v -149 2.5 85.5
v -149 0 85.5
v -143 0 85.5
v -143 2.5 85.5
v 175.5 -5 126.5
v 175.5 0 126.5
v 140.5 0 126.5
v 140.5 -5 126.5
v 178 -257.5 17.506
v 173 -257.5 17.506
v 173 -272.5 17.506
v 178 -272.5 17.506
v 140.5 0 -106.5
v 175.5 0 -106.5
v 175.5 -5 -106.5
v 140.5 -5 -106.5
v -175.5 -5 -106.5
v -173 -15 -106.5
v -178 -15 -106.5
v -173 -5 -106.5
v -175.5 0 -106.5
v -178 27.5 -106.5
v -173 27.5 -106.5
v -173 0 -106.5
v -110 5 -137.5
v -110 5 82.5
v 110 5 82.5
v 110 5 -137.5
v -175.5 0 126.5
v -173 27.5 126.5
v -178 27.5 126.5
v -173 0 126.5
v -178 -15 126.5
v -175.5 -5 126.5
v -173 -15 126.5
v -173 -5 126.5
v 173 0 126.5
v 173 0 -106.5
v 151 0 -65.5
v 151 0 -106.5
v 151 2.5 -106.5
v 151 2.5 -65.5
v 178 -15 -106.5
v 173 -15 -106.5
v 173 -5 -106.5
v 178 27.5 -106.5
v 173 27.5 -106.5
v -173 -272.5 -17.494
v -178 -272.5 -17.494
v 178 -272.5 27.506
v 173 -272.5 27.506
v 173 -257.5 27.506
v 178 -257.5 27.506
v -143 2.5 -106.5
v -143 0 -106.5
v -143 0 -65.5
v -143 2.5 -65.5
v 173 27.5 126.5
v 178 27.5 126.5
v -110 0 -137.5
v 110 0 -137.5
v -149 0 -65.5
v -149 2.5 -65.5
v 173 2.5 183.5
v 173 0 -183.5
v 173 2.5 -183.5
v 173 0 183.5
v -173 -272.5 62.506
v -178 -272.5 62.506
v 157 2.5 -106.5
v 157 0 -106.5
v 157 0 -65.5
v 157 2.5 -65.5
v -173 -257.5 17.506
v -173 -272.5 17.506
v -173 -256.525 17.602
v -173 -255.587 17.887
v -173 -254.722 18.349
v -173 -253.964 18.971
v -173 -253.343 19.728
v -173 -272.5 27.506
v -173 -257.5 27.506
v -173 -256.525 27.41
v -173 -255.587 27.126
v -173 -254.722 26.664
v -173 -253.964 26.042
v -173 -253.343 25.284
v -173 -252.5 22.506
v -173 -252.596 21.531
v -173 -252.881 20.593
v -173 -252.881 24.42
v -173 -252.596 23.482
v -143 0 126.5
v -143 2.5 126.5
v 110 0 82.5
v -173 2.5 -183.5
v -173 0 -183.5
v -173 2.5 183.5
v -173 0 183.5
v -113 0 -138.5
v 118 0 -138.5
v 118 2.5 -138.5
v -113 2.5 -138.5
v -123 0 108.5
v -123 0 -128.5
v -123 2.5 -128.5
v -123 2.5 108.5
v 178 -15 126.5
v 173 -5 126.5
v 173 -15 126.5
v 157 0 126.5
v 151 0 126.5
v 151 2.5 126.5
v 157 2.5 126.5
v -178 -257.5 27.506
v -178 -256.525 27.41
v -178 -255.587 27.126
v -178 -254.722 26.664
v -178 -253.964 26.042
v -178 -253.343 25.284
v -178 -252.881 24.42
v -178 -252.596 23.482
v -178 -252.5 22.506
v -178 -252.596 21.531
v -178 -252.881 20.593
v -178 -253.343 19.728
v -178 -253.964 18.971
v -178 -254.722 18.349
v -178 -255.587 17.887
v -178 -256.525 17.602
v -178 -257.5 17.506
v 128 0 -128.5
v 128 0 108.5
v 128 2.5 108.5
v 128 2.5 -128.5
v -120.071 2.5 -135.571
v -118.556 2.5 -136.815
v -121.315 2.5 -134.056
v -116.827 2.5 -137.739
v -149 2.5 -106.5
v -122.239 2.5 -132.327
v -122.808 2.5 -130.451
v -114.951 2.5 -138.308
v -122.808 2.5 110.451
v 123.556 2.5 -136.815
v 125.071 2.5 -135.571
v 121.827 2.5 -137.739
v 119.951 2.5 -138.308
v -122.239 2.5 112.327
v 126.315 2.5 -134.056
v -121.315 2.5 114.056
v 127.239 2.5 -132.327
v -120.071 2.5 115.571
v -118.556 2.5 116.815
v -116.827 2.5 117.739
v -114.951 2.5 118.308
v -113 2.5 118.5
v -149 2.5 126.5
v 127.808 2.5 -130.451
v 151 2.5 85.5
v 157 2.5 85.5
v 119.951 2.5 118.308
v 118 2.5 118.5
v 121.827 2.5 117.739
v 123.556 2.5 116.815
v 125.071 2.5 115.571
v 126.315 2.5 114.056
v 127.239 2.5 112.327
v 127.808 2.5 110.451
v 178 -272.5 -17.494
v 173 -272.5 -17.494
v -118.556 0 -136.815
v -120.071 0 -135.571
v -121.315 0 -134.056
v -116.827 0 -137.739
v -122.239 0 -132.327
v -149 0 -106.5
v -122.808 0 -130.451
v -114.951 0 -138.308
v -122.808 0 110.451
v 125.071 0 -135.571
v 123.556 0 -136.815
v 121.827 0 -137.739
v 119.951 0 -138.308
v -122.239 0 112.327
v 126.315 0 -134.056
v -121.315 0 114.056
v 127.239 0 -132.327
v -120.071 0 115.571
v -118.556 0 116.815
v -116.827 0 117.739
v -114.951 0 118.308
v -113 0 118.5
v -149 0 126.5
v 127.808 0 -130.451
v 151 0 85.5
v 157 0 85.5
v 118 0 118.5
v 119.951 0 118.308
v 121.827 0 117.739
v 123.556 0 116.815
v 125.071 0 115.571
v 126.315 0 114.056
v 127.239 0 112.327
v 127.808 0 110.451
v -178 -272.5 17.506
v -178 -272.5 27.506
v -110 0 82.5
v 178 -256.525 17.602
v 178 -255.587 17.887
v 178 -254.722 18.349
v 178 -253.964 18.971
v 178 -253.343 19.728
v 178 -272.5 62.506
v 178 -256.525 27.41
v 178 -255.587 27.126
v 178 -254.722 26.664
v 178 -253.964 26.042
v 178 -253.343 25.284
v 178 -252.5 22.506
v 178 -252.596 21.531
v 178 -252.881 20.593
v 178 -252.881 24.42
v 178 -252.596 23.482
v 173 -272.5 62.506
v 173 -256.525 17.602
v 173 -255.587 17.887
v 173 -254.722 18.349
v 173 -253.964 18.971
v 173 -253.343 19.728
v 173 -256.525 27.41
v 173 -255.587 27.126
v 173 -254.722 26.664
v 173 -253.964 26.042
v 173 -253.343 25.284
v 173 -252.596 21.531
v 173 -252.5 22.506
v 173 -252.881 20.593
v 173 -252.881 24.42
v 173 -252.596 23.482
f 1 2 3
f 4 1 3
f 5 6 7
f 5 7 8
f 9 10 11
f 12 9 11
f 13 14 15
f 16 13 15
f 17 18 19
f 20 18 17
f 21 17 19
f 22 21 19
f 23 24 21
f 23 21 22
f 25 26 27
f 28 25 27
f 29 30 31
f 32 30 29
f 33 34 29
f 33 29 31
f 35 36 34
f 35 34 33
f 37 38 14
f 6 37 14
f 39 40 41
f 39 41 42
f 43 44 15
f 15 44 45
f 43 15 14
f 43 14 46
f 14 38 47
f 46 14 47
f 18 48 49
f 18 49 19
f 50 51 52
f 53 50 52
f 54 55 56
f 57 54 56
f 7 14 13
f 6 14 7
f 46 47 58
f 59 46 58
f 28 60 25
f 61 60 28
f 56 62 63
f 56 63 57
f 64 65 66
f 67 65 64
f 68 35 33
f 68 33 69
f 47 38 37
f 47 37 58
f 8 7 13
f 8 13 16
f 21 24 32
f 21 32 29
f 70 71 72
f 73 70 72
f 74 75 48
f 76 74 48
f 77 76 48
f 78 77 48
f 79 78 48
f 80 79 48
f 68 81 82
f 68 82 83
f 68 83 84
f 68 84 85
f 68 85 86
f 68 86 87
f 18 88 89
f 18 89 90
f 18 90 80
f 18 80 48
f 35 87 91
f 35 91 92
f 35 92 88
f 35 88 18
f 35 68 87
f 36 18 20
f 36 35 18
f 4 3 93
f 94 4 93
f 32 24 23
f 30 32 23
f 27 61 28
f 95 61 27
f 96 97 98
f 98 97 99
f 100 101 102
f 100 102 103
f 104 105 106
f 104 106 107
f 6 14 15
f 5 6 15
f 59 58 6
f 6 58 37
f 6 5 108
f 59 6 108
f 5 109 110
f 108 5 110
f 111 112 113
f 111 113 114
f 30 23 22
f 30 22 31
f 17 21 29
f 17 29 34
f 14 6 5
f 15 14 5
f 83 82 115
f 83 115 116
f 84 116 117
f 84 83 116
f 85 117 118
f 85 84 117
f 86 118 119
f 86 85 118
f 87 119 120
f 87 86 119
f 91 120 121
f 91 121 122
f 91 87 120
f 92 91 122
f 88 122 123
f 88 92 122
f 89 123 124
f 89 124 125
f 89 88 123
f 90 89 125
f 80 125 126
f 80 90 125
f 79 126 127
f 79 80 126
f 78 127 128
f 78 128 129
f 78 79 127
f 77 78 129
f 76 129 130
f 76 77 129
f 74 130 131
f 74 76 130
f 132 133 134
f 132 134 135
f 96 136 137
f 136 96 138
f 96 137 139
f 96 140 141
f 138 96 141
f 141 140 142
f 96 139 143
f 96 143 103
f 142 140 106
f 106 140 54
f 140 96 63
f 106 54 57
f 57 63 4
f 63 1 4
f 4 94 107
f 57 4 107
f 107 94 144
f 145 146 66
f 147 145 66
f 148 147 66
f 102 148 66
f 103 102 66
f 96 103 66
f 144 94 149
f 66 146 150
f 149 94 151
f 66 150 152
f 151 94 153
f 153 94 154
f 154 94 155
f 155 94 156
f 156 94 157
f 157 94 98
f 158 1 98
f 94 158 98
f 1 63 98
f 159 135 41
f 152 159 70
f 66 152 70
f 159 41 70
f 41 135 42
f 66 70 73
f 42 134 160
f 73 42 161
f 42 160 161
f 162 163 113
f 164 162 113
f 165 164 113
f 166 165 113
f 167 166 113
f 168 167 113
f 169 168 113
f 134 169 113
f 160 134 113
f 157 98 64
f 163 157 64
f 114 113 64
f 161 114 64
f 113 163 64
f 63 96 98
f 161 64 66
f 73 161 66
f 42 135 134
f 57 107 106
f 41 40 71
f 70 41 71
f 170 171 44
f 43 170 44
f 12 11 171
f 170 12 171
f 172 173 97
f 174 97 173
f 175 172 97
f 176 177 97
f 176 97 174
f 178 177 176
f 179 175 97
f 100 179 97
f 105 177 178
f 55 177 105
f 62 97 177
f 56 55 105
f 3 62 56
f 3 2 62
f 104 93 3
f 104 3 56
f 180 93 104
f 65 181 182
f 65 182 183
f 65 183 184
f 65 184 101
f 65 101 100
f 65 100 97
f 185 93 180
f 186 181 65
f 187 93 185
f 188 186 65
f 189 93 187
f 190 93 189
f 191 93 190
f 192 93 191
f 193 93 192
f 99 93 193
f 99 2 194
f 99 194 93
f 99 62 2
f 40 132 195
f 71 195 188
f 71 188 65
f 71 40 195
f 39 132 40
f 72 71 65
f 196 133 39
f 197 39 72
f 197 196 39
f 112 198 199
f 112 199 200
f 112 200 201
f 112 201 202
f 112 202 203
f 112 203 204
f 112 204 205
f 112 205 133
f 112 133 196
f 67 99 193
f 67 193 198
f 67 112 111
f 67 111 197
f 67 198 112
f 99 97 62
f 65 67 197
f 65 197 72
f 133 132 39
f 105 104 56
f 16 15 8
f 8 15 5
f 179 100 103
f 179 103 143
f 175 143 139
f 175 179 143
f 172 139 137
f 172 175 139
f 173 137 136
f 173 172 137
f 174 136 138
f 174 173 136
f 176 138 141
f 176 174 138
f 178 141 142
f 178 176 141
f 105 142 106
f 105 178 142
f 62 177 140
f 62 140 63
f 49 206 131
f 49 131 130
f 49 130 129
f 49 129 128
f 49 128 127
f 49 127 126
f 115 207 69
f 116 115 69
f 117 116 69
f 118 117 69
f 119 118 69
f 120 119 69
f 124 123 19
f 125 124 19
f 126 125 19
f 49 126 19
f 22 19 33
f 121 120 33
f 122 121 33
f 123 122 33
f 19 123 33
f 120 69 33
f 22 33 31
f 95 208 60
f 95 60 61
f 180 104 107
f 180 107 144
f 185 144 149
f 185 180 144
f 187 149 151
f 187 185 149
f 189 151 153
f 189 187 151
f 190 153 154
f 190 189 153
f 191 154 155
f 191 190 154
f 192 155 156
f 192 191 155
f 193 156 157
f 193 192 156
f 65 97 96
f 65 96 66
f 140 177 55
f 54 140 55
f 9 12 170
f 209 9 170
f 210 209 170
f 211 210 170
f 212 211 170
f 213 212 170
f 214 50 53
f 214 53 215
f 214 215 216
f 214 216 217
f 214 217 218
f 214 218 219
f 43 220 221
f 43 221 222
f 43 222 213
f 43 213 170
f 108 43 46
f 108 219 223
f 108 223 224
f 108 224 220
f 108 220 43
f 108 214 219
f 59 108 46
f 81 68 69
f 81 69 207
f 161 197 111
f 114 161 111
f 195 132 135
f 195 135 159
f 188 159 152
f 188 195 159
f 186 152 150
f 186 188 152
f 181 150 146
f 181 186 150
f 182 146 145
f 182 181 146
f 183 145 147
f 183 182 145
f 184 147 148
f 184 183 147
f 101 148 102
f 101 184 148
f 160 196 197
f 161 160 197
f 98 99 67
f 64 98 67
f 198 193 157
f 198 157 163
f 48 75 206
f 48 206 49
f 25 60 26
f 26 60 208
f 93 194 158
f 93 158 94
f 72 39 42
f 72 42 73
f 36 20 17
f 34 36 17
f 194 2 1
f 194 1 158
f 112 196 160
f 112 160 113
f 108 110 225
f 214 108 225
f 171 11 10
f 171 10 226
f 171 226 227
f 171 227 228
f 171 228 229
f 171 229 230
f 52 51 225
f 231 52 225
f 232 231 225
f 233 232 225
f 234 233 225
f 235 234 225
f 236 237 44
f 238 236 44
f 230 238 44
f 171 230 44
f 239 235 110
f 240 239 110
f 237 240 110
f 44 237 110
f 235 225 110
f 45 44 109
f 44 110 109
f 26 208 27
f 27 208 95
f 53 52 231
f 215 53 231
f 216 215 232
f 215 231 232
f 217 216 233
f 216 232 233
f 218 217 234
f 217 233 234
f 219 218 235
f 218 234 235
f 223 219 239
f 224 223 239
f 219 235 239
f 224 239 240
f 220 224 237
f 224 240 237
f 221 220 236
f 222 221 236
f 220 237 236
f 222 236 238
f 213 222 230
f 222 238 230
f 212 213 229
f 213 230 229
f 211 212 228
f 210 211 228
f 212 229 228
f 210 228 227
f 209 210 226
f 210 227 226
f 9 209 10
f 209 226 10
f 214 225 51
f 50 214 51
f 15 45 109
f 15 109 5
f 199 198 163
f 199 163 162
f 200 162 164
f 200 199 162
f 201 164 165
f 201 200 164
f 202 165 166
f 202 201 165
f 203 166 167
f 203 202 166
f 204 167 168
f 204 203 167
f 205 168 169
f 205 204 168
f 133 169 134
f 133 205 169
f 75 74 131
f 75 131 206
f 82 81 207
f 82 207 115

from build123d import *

# Parameters (mm, degrees)
F0_W      = 346
F0_H      = 367
F0_W_2    = 6
F0_H_2    = 41
F1_DEPTH  = 2.5
F0_W_3    = 220
F0_H_3    = 220
F2_DEPTH  = 5
F4_DEPTH  = 5
F5_W      = 2.5
F5_H      = 5
F6_DEPTH  = 290.001
F6_FACE_W = 5
F6_FACE_H = 233
F8_DEPTH  = 35


with BuildPart() as f1:
    # F0 (on Front) → F1 (new body)
    with BuildSketch(Plane.XZ):
        Rectangle(F0_W, F0_H)
        with Locations((-146, -86)):
            Rectangle(F0_W_2, F0_H_2, mode=Mode.SUBTRACT)
        with BuildLine():
            ThreePointArc((128, -128.5), (125.071068, -135.571068), (118, -138.5))
            Line((118, -138.5), (-113, -138.5))
            ThreePointArc((-113, -138.5), (-120.071068, -135.571068), (-123, -128.5))
            Line((-123, -128.5), (-123, 108.5))
            ThreePointArc((-123, 108.5), (-120.071068, 115.571068), (-113, 118.5))
            Line((-113, 118.5), (118, 118.5))
            ThreePointArc((118, 118.5), (125.071068, 115.571068), (128, 108.5))
            Line((128, 108.5), (128, -128.5))
        make_face(mode=Mode.SUBTRACT)
        with Locations((154, -86)):
            Rectangle(F0_W_2, F0_H_2, mode=Mode.SUBTRACT)
        with Locations((-146, 106)):
            Rectangle(F0_W_2, F0_H_2, mode=Mode.SUBTRACT)
        with Locations((154, 106)):
            Rectangle(F0_W_2, F0_H_2, mode=Mode.SUBTRACT)
    extrude(amount=-F1_DEPTH)


with BuildPart() as f2:
    # F0 (on Front) → F2 (new body)
    with BuildSketch(Plane.XZ):
        with Locations((0, -27.5)):
            Rectangle(F0_W_3, F0_H_3)
    extrude(amount=-F2_DEPTH)


with BuildPart() as f4:
    # F3 (on face) → F4 (new body)
    with BuildSketch(Plane.YZ.offset(173)):
        with BuildLine():
            Line((-272.5, -17.49375), (-15, -106.5))
            Line((-15, -106.5), (27.5, -106.5))
            Line((27.5, -106.5), (27.5, 126.5))
            Line((27.5, 126.5), (-15, 126.5))
            Line((-15, 126.5), (-272.5, 62.50625))
            Line((-272.5, 62.50625), (-272.5, 27.50625))
            Line((-272.5, 27.50625), (-257.5, 27.50625))
            ThreePointArc((-257.5, 27.50625), (-252.5, 22.50625), (-257.5, 17.50625))
            Line((-257.5, 17.50625), (-272.5, 17.50625))
            Line((-272.5, 17.50625), (-272.5, -17.49375))
        make_face()
    extrude(amount=F4_DEPTH)

    # F5 (on face) → F6 (cut, through all)
    with BuildSketch(Plane(origin=(0, 0, -106.5), x_dir=(1, 0, 0), z_dir=(0, 0, -1))):
        with Locations((174.25, 2.5)):
            Rectangle(F5_W, F5_H)
    extrude(amount=-F6_DEPTH, mode=Mode.SUBTRACT)


with BuildPart() as f7_1:
    # F7: instance of F4
    add(f4.part.mirror(Plane.YZ))


with BuildPart() as f8:
    # F6_face (on face) → F8 (new body)
    with BuildSketch(Plane(origin=(175.5, -2.5, 10), x_dir=(0, -1, 0), z_dir=(-1, 0, 0))):
        Rectangle(F6_FACE_W, F6_FACE_H)
    extrude(amount=F8_DEPTH)


solid = Compound([f1.part, f2.part, f4.part, f7_1.part, f8.part])
